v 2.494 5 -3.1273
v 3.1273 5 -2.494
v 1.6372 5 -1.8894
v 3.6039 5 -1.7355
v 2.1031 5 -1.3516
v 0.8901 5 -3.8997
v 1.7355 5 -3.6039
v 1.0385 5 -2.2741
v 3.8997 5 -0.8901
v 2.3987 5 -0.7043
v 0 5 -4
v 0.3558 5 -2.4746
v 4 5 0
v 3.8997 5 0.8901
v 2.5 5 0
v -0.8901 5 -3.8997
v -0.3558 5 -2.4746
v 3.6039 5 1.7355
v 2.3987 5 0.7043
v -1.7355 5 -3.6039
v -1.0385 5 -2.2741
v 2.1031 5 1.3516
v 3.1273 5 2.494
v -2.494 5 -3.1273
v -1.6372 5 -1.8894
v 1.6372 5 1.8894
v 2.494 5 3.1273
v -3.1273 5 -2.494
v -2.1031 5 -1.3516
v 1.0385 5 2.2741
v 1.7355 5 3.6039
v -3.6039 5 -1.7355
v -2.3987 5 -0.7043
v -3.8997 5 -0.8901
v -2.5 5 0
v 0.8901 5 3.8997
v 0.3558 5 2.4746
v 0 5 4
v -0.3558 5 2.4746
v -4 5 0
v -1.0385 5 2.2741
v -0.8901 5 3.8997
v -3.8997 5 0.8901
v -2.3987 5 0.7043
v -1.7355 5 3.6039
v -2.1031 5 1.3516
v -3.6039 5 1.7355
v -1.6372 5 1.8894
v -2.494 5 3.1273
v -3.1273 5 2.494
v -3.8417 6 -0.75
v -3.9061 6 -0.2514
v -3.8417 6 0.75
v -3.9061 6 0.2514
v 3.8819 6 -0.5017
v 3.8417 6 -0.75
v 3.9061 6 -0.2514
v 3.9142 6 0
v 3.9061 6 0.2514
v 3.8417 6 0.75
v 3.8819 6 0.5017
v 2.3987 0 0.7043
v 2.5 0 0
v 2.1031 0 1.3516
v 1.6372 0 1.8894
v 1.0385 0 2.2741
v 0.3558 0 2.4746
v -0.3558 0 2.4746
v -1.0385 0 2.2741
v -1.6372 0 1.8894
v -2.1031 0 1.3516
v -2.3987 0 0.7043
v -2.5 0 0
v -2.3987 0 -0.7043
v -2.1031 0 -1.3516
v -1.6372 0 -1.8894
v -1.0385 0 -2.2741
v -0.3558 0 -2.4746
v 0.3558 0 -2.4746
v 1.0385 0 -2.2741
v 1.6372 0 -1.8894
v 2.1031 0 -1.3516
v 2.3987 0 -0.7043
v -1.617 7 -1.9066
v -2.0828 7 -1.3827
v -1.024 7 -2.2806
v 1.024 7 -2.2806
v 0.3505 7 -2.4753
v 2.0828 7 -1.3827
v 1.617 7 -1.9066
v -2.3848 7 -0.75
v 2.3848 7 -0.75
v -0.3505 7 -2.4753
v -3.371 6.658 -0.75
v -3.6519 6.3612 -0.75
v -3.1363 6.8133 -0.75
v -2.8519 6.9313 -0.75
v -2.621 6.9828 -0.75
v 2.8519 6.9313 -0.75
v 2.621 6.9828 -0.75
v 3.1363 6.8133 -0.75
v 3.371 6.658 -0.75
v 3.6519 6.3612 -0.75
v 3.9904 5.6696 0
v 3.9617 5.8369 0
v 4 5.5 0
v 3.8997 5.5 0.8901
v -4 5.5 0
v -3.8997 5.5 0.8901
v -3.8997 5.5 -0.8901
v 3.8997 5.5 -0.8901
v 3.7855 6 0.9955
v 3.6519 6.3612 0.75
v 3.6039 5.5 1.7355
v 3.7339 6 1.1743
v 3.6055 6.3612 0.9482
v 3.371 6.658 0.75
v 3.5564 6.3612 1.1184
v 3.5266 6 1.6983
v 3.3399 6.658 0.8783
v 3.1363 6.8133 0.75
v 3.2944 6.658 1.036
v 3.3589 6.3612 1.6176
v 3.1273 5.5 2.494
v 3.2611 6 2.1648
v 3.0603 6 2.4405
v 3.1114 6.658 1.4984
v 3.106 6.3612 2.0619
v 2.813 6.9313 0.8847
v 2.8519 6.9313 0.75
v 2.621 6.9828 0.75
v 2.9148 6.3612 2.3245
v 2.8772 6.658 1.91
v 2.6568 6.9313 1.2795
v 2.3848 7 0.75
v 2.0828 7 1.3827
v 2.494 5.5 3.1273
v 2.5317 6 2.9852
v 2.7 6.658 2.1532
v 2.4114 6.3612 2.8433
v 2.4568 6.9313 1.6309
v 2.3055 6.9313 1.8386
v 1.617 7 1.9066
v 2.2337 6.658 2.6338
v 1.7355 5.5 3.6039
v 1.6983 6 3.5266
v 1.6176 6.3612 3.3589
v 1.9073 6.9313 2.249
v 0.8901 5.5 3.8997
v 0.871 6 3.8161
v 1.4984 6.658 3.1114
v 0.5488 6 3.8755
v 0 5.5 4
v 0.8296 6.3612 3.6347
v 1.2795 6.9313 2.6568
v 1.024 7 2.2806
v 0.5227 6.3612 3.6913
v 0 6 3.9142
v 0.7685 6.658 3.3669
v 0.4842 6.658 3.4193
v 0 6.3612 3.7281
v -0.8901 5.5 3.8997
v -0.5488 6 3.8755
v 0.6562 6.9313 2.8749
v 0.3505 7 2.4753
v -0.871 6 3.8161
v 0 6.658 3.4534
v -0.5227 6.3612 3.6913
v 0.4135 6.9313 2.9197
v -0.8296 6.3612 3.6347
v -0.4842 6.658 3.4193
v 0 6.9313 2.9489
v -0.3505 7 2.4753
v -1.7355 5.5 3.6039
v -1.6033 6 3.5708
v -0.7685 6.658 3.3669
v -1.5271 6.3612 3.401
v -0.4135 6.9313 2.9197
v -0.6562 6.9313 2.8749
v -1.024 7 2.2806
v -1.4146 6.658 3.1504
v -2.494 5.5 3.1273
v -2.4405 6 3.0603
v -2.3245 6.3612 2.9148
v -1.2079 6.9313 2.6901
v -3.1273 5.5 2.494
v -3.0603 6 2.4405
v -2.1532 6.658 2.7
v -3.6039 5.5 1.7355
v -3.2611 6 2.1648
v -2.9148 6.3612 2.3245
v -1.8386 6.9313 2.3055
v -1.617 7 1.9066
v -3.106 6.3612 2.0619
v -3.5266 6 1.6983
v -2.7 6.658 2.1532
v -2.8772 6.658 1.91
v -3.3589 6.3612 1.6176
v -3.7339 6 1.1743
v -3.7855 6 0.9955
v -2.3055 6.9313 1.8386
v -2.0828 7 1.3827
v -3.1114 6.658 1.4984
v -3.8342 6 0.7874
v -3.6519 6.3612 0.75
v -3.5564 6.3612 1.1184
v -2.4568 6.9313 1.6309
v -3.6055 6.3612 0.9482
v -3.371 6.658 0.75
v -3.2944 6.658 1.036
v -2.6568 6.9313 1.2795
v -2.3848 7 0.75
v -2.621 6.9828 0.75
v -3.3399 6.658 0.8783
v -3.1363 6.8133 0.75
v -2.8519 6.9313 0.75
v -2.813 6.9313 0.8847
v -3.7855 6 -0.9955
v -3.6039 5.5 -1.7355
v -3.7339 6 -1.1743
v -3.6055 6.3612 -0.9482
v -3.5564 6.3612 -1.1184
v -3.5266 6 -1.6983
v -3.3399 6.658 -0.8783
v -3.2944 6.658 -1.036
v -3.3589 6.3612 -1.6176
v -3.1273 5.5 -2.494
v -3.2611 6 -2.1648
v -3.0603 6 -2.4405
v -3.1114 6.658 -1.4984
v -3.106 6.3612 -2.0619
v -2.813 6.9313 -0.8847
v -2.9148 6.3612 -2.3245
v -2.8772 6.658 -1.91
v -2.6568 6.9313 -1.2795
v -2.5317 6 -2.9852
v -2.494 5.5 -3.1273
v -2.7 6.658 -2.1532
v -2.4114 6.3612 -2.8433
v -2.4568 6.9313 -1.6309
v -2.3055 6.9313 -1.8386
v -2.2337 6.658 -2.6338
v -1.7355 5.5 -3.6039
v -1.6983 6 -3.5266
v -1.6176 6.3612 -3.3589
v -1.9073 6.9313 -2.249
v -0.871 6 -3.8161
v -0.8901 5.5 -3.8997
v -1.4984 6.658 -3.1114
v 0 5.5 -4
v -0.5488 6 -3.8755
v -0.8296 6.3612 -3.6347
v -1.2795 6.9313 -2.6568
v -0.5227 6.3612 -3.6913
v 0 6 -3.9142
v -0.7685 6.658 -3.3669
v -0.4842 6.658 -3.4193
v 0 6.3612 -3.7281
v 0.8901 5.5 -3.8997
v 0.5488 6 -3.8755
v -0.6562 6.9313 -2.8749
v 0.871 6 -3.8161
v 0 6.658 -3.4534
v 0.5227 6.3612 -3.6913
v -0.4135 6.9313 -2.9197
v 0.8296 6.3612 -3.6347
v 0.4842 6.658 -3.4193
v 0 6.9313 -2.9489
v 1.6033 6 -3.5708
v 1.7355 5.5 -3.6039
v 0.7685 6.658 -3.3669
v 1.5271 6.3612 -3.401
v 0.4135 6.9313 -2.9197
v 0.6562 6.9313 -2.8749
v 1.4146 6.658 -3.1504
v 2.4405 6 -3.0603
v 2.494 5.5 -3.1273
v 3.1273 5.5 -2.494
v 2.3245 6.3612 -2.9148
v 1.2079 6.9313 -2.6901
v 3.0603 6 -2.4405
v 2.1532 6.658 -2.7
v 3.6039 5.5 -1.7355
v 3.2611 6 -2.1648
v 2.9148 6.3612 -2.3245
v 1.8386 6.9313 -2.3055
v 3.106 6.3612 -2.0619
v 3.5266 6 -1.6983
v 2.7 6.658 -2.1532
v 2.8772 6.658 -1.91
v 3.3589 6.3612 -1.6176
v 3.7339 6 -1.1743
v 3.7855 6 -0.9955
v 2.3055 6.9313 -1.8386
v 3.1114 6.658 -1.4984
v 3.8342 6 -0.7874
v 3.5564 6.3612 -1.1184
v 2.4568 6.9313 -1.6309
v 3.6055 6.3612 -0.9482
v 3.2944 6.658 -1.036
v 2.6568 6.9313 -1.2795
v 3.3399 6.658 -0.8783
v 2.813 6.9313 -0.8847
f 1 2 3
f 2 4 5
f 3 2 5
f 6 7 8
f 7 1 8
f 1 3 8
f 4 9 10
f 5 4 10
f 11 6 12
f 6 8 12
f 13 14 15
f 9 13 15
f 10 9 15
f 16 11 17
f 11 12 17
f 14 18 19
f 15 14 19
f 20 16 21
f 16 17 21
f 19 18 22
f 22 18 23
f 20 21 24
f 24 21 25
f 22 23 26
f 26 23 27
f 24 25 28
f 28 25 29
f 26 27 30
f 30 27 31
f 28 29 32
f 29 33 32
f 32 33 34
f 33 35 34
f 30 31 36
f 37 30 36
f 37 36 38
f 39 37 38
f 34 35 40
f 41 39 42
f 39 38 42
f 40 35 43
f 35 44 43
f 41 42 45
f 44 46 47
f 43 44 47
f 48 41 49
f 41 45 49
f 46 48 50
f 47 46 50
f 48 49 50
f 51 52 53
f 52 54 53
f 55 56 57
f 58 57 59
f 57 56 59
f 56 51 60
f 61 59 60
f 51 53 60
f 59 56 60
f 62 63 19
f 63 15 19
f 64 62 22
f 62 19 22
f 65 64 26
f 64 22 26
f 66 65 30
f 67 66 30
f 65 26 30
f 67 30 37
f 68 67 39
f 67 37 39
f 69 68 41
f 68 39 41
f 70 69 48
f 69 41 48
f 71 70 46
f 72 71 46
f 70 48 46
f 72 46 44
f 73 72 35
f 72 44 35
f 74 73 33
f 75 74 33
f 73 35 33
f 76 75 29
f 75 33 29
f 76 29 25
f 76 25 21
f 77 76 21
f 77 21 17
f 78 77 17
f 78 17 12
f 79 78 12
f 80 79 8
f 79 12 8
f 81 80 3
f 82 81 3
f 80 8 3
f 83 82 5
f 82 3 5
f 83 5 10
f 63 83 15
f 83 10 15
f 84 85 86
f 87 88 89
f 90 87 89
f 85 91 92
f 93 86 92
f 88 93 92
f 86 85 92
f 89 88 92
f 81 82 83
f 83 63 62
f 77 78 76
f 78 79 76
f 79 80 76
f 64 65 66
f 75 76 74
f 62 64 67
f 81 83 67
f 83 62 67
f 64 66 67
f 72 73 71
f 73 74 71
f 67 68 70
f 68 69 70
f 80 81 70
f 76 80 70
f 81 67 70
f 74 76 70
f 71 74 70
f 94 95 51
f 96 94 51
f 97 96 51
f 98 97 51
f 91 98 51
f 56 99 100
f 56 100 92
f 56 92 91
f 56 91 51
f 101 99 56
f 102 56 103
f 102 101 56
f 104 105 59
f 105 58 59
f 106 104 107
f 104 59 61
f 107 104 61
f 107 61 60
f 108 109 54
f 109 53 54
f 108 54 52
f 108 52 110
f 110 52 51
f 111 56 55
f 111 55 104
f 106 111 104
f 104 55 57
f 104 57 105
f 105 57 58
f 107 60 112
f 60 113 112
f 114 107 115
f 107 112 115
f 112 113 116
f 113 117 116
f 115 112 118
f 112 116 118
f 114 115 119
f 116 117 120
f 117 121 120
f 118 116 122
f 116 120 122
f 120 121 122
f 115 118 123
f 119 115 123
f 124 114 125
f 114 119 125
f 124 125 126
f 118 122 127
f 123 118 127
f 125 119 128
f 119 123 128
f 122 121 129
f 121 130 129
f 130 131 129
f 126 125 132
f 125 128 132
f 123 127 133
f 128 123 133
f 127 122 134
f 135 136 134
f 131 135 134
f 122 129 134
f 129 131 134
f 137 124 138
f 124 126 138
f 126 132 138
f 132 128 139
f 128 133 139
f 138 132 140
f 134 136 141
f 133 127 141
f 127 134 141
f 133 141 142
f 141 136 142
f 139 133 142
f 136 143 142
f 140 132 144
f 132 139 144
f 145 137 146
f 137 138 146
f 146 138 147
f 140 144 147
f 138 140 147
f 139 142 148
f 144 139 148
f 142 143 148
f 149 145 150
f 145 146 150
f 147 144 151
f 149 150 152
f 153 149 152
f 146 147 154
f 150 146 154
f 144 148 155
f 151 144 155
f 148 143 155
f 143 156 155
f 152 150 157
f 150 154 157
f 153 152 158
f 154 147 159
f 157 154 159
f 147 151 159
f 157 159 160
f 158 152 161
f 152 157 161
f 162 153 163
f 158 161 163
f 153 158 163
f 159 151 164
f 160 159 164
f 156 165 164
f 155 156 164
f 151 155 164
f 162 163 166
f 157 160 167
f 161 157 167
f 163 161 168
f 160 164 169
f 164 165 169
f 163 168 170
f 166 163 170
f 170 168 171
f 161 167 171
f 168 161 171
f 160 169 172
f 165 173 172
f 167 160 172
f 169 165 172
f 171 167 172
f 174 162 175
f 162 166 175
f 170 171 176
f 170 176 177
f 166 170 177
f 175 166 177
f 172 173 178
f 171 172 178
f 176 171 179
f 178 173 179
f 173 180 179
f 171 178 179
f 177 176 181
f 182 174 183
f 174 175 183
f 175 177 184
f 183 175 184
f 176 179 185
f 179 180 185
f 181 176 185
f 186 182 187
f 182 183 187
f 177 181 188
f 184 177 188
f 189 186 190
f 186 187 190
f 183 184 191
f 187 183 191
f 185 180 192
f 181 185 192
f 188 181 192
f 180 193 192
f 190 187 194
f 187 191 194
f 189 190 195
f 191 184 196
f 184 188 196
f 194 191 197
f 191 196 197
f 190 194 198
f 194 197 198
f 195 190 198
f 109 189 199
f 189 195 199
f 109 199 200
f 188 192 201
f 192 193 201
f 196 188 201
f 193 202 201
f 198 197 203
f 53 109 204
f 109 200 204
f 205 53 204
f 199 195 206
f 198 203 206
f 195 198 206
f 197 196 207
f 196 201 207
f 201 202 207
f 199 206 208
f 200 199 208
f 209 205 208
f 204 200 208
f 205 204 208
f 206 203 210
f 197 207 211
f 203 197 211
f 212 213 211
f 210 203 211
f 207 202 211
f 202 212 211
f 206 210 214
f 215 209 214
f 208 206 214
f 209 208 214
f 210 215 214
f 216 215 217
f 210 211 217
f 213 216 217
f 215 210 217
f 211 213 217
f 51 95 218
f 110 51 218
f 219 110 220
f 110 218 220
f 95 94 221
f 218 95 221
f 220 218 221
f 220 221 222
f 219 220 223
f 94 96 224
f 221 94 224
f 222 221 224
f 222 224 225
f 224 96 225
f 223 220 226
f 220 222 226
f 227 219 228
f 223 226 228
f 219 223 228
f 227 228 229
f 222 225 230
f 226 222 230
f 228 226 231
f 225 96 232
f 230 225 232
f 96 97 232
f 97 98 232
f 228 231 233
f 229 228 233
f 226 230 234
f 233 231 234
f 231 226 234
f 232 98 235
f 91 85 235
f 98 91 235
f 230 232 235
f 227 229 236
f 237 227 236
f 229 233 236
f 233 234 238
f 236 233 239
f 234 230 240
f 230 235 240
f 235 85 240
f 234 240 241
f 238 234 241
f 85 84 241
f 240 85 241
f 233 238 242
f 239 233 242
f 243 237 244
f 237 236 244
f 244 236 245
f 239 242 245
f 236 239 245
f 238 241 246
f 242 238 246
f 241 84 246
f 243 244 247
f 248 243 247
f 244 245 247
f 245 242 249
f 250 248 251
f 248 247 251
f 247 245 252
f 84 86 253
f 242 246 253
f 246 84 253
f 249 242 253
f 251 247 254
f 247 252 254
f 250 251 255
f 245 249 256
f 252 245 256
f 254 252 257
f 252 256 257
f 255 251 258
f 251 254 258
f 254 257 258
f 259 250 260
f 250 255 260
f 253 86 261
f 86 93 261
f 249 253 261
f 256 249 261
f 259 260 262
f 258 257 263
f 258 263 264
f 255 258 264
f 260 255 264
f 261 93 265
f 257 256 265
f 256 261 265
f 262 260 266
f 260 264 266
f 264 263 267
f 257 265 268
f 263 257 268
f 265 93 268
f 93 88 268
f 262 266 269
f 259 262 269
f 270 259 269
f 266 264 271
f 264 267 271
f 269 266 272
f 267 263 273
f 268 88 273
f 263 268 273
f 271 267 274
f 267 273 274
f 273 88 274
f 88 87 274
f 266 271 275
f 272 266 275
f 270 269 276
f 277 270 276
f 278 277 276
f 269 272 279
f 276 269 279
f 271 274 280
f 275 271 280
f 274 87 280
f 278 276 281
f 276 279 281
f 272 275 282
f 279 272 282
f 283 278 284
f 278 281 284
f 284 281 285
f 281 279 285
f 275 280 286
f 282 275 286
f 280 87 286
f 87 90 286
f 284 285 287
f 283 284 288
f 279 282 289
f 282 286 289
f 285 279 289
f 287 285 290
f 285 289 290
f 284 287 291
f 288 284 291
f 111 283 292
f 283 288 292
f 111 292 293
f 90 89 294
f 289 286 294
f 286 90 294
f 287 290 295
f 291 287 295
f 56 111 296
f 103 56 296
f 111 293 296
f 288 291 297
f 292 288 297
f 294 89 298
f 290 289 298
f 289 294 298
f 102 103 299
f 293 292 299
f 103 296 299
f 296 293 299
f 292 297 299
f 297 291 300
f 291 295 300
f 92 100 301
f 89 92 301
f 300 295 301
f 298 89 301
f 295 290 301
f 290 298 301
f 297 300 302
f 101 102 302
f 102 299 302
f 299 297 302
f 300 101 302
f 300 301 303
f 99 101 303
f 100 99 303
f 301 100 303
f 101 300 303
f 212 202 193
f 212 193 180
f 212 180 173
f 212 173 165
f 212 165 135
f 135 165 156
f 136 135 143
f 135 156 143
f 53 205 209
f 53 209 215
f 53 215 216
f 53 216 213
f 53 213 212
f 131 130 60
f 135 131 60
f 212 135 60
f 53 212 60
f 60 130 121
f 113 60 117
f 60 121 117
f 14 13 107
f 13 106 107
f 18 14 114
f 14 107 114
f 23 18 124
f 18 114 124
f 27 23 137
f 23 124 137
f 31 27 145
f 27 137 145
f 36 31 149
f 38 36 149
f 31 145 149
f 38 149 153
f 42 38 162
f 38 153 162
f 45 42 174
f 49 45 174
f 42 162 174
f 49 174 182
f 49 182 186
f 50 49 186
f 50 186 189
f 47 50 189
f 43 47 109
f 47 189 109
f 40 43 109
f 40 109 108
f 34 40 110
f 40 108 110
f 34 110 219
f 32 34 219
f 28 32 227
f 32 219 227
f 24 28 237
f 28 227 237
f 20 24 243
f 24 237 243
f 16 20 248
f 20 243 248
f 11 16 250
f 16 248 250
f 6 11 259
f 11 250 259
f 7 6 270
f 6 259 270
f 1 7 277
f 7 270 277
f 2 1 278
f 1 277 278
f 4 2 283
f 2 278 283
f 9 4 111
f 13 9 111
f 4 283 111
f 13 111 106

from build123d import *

# Parameters (mm, degrees)
ESBO_O2_W             = 8
ESBO_O2_H             = 1
CORTE_EXTRUS_O1_DEPTH = 0.75


with BuildPart() as part:
    # Esboço1 → Revolução1 (revolve)
    with BuildSketch(Plane.XY):
        with BuildLine():
            Line((0, 0), (2.5, 0))
            Line((2.5, 0), (2.5, 5))
            Line((2.5, 5), (4, 5))
            Line((4, 5), (4, 5.5))
            ThreePointArc((4, 5.5), (3.560660172, 6.560660172), (2.5, 7))
            Line((2.5, 7), (0, 7))
            Line((0, 7), (0, 0))
        make_face()
    revolve(axis=Axis((0, 7, 0), (0, -1, 0)))

    # Esboço2 → Corte-extrusão1 (cut, symmetric)
    with BuildSketch(Plane.XY):
        with Locations((0, 6.5)):
            Rectangle(ESBO_O2_W, ESBO_O2_H)
    extrude(amount=CORTE_EXTRUS_O1_DEPTH, both=True, mode=Mode.SUBTRACT)


solid = part.part
